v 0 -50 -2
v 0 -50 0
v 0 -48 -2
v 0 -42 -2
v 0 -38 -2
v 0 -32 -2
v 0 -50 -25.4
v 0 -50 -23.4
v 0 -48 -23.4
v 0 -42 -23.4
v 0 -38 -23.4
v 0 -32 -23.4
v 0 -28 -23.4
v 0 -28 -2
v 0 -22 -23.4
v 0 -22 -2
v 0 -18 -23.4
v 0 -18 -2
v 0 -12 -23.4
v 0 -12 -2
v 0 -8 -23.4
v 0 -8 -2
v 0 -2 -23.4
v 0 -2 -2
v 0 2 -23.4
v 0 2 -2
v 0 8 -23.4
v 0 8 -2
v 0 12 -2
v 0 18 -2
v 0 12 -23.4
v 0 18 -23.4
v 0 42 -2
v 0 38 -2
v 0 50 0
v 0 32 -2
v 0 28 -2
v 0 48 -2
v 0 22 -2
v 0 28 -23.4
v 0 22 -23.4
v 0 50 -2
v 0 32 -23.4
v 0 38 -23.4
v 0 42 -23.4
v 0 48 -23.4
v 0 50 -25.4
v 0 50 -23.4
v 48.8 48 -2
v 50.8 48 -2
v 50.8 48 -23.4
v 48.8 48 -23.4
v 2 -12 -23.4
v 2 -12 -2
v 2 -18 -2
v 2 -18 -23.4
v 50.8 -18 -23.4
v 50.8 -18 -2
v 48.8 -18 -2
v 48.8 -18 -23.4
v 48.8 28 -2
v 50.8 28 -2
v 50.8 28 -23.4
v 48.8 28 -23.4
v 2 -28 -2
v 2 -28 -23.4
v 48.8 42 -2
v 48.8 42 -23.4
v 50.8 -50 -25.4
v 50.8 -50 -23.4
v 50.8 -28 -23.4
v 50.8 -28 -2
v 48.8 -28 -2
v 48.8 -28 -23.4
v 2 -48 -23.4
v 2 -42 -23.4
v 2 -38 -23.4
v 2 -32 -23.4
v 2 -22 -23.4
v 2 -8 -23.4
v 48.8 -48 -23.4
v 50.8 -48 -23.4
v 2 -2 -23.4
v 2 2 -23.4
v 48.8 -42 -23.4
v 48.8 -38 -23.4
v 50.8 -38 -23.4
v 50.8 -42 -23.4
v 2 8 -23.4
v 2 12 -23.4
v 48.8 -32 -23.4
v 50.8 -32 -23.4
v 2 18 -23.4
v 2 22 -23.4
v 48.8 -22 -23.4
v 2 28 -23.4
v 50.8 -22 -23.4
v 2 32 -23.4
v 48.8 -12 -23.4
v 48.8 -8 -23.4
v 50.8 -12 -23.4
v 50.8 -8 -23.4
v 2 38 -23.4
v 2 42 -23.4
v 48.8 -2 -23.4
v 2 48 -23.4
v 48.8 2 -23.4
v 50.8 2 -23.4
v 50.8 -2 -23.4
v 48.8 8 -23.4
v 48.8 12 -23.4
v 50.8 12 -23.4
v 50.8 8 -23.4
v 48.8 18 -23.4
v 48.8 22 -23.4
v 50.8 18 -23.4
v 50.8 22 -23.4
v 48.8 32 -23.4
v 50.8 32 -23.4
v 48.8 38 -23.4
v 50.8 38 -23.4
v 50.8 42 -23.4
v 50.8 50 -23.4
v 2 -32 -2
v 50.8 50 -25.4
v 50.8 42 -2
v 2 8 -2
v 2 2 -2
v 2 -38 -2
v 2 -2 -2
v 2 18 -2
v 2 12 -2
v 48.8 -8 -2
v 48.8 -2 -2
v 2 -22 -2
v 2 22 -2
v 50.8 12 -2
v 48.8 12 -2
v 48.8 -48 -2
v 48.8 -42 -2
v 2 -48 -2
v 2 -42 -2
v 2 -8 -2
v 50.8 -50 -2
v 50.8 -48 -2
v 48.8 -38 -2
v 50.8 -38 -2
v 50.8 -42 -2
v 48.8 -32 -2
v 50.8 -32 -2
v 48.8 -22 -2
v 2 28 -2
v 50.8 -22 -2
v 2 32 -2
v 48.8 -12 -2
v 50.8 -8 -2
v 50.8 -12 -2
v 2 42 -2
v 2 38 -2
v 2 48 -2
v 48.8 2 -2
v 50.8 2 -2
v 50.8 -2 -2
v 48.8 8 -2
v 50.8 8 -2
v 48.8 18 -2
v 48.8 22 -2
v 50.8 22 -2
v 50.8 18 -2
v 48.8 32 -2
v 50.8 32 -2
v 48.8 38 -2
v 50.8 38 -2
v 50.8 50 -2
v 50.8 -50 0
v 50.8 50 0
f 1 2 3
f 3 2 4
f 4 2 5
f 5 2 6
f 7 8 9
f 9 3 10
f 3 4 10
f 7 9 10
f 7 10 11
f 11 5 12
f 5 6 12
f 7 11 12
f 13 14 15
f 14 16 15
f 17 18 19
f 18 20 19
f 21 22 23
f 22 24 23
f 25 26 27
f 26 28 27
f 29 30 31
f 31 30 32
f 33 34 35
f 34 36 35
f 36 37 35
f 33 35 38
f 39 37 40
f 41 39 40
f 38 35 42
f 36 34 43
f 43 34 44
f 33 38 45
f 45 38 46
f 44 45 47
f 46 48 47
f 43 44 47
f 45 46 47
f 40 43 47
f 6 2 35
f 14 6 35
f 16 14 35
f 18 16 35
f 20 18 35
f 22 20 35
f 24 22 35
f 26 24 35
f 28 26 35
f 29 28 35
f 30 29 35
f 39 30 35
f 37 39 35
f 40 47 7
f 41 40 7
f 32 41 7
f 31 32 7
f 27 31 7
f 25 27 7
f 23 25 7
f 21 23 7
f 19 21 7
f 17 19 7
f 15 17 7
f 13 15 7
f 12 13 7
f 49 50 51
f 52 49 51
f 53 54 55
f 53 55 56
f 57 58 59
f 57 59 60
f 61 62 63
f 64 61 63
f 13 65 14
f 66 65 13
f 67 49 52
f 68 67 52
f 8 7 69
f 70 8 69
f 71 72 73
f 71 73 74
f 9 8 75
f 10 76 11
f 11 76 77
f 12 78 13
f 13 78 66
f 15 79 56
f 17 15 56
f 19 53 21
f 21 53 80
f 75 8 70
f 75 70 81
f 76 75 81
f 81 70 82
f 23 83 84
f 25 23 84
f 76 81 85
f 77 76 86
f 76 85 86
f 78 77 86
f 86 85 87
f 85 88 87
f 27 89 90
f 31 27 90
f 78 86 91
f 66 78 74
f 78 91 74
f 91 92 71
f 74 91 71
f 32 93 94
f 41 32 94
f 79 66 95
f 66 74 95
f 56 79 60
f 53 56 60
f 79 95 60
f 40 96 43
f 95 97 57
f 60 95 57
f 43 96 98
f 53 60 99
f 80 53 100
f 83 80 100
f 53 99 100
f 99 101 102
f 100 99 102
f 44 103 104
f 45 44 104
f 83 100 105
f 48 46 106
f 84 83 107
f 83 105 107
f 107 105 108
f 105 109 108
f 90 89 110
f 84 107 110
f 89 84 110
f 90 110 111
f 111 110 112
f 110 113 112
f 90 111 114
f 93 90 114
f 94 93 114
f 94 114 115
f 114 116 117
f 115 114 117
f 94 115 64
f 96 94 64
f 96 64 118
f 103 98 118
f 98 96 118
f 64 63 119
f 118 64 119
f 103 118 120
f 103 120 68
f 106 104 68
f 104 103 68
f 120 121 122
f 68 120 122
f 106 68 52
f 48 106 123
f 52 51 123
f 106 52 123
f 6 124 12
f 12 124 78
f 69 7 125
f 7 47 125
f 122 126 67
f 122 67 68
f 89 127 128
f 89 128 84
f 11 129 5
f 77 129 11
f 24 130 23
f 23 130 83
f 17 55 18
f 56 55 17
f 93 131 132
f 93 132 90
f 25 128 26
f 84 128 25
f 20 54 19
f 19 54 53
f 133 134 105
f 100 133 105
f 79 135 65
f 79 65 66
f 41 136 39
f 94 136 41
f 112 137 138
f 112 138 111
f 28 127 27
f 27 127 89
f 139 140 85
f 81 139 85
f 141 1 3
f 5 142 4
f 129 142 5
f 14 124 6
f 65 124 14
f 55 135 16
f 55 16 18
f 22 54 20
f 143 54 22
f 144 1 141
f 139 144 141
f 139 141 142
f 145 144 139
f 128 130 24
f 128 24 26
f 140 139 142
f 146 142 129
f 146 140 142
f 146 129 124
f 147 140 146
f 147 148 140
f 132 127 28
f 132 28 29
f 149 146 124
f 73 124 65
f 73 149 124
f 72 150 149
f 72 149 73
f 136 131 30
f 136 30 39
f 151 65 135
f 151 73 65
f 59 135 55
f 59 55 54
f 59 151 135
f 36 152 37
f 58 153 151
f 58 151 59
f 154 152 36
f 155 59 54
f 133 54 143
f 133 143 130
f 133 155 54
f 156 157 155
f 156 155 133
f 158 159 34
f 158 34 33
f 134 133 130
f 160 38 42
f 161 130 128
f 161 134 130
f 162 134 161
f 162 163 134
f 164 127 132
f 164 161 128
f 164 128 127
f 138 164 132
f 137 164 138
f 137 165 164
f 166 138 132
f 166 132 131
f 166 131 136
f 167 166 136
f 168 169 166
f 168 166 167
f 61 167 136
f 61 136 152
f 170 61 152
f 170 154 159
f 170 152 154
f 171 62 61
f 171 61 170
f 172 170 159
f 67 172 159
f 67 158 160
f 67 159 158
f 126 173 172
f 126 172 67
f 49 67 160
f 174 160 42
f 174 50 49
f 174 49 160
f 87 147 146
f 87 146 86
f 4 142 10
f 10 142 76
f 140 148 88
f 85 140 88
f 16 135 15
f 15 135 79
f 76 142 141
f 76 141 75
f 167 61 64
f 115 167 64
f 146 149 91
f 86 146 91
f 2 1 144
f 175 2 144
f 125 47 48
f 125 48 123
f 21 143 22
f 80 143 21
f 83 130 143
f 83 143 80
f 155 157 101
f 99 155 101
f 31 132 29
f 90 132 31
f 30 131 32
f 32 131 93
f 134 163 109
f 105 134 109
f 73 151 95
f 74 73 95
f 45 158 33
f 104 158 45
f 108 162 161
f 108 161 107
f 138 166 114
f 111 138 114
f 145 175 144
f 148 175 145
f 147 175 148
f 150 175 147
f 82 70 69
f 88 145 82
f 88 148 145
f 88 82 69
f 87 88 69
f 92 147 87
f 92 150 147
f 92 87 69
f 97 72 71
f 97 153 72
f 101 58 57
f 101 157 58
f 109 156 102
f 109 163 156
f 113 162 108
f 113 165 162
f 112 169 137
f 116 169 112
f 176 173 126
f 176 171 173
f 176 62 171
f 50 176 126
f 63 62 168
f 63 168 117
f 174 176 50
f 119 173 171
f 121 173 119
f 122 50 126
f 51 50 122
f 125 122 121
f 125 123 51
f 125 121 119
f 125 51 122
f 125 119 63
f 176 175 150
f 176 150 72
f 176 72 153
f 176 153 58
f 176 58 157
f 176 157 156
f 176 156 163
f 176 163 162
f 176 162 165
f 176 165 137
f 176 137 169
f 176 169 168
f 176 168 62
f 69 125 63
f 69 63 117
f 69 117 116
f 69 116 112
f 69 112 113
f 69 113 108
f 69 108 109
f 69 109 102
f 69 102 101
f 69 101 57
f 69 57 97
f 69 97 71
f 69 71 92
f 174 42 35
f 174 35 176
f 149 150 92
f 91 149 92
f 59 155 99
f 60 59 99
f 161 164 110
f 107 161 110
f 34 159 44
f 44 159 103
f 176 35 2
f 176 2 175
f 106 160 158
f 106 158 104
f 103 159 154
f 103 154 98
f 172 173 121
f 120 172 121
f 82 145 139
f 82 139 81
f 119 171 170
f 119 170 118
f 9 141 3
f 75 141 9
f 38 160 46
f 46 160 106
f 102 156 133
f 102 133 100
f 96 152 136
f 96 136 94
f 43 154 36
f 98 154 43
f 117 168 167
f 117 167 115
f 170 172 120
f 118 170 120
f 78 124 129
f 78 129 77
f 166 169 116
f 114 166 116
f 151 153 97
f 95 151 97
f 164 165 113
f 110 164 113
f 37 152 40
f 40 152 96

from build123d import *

# Parameters (mm, degrees)
SKETCH1_W           = 50.8
SKETCH1_H           = 25.4
SKETCH1_W_2         = 46.8
SKETCH1_H_2         = 21.4
BOSS_EXTRUDE1_DEPTH = 50
SKETCH2_W           = 21.4
SKETCH2_H           = 4
CUT_EXTRUDE1_DEPTH  = 76.669016116
LPATTERN1_COUNT     = 6
LPATTERN1_PITCH     = 10
LPATTERN1_COL_COUNT = 6
LPATTERN1_COL_PITCH = 10


with BuildPart() as part:
    # Sketch1 → Boss-Extrude1 (new, symmetric)
    with BuildSketch(Plane(origin=(0, 0, 0), x_dir=(1, 0, 0), z_dir=(0, 1, 0))):
        with Locations((25.4, 12.7)):
            Rectangle(SKETCH1_W, SKETCH1_H)
        with Locations((25.4, 12.7)):
            Rectangle(SKETCH1_W_2, SKETCH1_H_2, mode=Mode.SUBTRACT)
    extrude(amount=BOSS_EXTRUDE1_DEPTH, both=True)

    # Sketch2 → Cut-Extrude1 (cut, through all)
    with BuildSketch(Plane(origin=(50.8, 0, 0), x_dir=(0, 0, -1), z_dir=(1, 0, 0))):
        with Locations((12.7, 0)):
            Rectangle(SKETCH2_W, SKETCH2_H)
    cut_extrude1 = extrude(amount=-CUT_EXTRUDE1_DEPTH, mode=Mode.SUBTRACT)

    # LPattern1: Cut-Extrude1 ×6
    with Locations(*[(0, -i * LPATTERN1_PITCH, 0) for i in range(1, LPATTERN1_COUNT)]):
        add(cut_extrude1, mode=Mode.SUBTRACT)

    # LPattern1 col: Cut-Extrude1 ×6
    with Locations(*[(0, i * LPATTERN1_COL_PITCH, 0) for i in range(1, LPATTERN1_COL_COUNT)]):
        add(cut_extrude1, mode=Mode.SUBTRACT)


solid = part.part
